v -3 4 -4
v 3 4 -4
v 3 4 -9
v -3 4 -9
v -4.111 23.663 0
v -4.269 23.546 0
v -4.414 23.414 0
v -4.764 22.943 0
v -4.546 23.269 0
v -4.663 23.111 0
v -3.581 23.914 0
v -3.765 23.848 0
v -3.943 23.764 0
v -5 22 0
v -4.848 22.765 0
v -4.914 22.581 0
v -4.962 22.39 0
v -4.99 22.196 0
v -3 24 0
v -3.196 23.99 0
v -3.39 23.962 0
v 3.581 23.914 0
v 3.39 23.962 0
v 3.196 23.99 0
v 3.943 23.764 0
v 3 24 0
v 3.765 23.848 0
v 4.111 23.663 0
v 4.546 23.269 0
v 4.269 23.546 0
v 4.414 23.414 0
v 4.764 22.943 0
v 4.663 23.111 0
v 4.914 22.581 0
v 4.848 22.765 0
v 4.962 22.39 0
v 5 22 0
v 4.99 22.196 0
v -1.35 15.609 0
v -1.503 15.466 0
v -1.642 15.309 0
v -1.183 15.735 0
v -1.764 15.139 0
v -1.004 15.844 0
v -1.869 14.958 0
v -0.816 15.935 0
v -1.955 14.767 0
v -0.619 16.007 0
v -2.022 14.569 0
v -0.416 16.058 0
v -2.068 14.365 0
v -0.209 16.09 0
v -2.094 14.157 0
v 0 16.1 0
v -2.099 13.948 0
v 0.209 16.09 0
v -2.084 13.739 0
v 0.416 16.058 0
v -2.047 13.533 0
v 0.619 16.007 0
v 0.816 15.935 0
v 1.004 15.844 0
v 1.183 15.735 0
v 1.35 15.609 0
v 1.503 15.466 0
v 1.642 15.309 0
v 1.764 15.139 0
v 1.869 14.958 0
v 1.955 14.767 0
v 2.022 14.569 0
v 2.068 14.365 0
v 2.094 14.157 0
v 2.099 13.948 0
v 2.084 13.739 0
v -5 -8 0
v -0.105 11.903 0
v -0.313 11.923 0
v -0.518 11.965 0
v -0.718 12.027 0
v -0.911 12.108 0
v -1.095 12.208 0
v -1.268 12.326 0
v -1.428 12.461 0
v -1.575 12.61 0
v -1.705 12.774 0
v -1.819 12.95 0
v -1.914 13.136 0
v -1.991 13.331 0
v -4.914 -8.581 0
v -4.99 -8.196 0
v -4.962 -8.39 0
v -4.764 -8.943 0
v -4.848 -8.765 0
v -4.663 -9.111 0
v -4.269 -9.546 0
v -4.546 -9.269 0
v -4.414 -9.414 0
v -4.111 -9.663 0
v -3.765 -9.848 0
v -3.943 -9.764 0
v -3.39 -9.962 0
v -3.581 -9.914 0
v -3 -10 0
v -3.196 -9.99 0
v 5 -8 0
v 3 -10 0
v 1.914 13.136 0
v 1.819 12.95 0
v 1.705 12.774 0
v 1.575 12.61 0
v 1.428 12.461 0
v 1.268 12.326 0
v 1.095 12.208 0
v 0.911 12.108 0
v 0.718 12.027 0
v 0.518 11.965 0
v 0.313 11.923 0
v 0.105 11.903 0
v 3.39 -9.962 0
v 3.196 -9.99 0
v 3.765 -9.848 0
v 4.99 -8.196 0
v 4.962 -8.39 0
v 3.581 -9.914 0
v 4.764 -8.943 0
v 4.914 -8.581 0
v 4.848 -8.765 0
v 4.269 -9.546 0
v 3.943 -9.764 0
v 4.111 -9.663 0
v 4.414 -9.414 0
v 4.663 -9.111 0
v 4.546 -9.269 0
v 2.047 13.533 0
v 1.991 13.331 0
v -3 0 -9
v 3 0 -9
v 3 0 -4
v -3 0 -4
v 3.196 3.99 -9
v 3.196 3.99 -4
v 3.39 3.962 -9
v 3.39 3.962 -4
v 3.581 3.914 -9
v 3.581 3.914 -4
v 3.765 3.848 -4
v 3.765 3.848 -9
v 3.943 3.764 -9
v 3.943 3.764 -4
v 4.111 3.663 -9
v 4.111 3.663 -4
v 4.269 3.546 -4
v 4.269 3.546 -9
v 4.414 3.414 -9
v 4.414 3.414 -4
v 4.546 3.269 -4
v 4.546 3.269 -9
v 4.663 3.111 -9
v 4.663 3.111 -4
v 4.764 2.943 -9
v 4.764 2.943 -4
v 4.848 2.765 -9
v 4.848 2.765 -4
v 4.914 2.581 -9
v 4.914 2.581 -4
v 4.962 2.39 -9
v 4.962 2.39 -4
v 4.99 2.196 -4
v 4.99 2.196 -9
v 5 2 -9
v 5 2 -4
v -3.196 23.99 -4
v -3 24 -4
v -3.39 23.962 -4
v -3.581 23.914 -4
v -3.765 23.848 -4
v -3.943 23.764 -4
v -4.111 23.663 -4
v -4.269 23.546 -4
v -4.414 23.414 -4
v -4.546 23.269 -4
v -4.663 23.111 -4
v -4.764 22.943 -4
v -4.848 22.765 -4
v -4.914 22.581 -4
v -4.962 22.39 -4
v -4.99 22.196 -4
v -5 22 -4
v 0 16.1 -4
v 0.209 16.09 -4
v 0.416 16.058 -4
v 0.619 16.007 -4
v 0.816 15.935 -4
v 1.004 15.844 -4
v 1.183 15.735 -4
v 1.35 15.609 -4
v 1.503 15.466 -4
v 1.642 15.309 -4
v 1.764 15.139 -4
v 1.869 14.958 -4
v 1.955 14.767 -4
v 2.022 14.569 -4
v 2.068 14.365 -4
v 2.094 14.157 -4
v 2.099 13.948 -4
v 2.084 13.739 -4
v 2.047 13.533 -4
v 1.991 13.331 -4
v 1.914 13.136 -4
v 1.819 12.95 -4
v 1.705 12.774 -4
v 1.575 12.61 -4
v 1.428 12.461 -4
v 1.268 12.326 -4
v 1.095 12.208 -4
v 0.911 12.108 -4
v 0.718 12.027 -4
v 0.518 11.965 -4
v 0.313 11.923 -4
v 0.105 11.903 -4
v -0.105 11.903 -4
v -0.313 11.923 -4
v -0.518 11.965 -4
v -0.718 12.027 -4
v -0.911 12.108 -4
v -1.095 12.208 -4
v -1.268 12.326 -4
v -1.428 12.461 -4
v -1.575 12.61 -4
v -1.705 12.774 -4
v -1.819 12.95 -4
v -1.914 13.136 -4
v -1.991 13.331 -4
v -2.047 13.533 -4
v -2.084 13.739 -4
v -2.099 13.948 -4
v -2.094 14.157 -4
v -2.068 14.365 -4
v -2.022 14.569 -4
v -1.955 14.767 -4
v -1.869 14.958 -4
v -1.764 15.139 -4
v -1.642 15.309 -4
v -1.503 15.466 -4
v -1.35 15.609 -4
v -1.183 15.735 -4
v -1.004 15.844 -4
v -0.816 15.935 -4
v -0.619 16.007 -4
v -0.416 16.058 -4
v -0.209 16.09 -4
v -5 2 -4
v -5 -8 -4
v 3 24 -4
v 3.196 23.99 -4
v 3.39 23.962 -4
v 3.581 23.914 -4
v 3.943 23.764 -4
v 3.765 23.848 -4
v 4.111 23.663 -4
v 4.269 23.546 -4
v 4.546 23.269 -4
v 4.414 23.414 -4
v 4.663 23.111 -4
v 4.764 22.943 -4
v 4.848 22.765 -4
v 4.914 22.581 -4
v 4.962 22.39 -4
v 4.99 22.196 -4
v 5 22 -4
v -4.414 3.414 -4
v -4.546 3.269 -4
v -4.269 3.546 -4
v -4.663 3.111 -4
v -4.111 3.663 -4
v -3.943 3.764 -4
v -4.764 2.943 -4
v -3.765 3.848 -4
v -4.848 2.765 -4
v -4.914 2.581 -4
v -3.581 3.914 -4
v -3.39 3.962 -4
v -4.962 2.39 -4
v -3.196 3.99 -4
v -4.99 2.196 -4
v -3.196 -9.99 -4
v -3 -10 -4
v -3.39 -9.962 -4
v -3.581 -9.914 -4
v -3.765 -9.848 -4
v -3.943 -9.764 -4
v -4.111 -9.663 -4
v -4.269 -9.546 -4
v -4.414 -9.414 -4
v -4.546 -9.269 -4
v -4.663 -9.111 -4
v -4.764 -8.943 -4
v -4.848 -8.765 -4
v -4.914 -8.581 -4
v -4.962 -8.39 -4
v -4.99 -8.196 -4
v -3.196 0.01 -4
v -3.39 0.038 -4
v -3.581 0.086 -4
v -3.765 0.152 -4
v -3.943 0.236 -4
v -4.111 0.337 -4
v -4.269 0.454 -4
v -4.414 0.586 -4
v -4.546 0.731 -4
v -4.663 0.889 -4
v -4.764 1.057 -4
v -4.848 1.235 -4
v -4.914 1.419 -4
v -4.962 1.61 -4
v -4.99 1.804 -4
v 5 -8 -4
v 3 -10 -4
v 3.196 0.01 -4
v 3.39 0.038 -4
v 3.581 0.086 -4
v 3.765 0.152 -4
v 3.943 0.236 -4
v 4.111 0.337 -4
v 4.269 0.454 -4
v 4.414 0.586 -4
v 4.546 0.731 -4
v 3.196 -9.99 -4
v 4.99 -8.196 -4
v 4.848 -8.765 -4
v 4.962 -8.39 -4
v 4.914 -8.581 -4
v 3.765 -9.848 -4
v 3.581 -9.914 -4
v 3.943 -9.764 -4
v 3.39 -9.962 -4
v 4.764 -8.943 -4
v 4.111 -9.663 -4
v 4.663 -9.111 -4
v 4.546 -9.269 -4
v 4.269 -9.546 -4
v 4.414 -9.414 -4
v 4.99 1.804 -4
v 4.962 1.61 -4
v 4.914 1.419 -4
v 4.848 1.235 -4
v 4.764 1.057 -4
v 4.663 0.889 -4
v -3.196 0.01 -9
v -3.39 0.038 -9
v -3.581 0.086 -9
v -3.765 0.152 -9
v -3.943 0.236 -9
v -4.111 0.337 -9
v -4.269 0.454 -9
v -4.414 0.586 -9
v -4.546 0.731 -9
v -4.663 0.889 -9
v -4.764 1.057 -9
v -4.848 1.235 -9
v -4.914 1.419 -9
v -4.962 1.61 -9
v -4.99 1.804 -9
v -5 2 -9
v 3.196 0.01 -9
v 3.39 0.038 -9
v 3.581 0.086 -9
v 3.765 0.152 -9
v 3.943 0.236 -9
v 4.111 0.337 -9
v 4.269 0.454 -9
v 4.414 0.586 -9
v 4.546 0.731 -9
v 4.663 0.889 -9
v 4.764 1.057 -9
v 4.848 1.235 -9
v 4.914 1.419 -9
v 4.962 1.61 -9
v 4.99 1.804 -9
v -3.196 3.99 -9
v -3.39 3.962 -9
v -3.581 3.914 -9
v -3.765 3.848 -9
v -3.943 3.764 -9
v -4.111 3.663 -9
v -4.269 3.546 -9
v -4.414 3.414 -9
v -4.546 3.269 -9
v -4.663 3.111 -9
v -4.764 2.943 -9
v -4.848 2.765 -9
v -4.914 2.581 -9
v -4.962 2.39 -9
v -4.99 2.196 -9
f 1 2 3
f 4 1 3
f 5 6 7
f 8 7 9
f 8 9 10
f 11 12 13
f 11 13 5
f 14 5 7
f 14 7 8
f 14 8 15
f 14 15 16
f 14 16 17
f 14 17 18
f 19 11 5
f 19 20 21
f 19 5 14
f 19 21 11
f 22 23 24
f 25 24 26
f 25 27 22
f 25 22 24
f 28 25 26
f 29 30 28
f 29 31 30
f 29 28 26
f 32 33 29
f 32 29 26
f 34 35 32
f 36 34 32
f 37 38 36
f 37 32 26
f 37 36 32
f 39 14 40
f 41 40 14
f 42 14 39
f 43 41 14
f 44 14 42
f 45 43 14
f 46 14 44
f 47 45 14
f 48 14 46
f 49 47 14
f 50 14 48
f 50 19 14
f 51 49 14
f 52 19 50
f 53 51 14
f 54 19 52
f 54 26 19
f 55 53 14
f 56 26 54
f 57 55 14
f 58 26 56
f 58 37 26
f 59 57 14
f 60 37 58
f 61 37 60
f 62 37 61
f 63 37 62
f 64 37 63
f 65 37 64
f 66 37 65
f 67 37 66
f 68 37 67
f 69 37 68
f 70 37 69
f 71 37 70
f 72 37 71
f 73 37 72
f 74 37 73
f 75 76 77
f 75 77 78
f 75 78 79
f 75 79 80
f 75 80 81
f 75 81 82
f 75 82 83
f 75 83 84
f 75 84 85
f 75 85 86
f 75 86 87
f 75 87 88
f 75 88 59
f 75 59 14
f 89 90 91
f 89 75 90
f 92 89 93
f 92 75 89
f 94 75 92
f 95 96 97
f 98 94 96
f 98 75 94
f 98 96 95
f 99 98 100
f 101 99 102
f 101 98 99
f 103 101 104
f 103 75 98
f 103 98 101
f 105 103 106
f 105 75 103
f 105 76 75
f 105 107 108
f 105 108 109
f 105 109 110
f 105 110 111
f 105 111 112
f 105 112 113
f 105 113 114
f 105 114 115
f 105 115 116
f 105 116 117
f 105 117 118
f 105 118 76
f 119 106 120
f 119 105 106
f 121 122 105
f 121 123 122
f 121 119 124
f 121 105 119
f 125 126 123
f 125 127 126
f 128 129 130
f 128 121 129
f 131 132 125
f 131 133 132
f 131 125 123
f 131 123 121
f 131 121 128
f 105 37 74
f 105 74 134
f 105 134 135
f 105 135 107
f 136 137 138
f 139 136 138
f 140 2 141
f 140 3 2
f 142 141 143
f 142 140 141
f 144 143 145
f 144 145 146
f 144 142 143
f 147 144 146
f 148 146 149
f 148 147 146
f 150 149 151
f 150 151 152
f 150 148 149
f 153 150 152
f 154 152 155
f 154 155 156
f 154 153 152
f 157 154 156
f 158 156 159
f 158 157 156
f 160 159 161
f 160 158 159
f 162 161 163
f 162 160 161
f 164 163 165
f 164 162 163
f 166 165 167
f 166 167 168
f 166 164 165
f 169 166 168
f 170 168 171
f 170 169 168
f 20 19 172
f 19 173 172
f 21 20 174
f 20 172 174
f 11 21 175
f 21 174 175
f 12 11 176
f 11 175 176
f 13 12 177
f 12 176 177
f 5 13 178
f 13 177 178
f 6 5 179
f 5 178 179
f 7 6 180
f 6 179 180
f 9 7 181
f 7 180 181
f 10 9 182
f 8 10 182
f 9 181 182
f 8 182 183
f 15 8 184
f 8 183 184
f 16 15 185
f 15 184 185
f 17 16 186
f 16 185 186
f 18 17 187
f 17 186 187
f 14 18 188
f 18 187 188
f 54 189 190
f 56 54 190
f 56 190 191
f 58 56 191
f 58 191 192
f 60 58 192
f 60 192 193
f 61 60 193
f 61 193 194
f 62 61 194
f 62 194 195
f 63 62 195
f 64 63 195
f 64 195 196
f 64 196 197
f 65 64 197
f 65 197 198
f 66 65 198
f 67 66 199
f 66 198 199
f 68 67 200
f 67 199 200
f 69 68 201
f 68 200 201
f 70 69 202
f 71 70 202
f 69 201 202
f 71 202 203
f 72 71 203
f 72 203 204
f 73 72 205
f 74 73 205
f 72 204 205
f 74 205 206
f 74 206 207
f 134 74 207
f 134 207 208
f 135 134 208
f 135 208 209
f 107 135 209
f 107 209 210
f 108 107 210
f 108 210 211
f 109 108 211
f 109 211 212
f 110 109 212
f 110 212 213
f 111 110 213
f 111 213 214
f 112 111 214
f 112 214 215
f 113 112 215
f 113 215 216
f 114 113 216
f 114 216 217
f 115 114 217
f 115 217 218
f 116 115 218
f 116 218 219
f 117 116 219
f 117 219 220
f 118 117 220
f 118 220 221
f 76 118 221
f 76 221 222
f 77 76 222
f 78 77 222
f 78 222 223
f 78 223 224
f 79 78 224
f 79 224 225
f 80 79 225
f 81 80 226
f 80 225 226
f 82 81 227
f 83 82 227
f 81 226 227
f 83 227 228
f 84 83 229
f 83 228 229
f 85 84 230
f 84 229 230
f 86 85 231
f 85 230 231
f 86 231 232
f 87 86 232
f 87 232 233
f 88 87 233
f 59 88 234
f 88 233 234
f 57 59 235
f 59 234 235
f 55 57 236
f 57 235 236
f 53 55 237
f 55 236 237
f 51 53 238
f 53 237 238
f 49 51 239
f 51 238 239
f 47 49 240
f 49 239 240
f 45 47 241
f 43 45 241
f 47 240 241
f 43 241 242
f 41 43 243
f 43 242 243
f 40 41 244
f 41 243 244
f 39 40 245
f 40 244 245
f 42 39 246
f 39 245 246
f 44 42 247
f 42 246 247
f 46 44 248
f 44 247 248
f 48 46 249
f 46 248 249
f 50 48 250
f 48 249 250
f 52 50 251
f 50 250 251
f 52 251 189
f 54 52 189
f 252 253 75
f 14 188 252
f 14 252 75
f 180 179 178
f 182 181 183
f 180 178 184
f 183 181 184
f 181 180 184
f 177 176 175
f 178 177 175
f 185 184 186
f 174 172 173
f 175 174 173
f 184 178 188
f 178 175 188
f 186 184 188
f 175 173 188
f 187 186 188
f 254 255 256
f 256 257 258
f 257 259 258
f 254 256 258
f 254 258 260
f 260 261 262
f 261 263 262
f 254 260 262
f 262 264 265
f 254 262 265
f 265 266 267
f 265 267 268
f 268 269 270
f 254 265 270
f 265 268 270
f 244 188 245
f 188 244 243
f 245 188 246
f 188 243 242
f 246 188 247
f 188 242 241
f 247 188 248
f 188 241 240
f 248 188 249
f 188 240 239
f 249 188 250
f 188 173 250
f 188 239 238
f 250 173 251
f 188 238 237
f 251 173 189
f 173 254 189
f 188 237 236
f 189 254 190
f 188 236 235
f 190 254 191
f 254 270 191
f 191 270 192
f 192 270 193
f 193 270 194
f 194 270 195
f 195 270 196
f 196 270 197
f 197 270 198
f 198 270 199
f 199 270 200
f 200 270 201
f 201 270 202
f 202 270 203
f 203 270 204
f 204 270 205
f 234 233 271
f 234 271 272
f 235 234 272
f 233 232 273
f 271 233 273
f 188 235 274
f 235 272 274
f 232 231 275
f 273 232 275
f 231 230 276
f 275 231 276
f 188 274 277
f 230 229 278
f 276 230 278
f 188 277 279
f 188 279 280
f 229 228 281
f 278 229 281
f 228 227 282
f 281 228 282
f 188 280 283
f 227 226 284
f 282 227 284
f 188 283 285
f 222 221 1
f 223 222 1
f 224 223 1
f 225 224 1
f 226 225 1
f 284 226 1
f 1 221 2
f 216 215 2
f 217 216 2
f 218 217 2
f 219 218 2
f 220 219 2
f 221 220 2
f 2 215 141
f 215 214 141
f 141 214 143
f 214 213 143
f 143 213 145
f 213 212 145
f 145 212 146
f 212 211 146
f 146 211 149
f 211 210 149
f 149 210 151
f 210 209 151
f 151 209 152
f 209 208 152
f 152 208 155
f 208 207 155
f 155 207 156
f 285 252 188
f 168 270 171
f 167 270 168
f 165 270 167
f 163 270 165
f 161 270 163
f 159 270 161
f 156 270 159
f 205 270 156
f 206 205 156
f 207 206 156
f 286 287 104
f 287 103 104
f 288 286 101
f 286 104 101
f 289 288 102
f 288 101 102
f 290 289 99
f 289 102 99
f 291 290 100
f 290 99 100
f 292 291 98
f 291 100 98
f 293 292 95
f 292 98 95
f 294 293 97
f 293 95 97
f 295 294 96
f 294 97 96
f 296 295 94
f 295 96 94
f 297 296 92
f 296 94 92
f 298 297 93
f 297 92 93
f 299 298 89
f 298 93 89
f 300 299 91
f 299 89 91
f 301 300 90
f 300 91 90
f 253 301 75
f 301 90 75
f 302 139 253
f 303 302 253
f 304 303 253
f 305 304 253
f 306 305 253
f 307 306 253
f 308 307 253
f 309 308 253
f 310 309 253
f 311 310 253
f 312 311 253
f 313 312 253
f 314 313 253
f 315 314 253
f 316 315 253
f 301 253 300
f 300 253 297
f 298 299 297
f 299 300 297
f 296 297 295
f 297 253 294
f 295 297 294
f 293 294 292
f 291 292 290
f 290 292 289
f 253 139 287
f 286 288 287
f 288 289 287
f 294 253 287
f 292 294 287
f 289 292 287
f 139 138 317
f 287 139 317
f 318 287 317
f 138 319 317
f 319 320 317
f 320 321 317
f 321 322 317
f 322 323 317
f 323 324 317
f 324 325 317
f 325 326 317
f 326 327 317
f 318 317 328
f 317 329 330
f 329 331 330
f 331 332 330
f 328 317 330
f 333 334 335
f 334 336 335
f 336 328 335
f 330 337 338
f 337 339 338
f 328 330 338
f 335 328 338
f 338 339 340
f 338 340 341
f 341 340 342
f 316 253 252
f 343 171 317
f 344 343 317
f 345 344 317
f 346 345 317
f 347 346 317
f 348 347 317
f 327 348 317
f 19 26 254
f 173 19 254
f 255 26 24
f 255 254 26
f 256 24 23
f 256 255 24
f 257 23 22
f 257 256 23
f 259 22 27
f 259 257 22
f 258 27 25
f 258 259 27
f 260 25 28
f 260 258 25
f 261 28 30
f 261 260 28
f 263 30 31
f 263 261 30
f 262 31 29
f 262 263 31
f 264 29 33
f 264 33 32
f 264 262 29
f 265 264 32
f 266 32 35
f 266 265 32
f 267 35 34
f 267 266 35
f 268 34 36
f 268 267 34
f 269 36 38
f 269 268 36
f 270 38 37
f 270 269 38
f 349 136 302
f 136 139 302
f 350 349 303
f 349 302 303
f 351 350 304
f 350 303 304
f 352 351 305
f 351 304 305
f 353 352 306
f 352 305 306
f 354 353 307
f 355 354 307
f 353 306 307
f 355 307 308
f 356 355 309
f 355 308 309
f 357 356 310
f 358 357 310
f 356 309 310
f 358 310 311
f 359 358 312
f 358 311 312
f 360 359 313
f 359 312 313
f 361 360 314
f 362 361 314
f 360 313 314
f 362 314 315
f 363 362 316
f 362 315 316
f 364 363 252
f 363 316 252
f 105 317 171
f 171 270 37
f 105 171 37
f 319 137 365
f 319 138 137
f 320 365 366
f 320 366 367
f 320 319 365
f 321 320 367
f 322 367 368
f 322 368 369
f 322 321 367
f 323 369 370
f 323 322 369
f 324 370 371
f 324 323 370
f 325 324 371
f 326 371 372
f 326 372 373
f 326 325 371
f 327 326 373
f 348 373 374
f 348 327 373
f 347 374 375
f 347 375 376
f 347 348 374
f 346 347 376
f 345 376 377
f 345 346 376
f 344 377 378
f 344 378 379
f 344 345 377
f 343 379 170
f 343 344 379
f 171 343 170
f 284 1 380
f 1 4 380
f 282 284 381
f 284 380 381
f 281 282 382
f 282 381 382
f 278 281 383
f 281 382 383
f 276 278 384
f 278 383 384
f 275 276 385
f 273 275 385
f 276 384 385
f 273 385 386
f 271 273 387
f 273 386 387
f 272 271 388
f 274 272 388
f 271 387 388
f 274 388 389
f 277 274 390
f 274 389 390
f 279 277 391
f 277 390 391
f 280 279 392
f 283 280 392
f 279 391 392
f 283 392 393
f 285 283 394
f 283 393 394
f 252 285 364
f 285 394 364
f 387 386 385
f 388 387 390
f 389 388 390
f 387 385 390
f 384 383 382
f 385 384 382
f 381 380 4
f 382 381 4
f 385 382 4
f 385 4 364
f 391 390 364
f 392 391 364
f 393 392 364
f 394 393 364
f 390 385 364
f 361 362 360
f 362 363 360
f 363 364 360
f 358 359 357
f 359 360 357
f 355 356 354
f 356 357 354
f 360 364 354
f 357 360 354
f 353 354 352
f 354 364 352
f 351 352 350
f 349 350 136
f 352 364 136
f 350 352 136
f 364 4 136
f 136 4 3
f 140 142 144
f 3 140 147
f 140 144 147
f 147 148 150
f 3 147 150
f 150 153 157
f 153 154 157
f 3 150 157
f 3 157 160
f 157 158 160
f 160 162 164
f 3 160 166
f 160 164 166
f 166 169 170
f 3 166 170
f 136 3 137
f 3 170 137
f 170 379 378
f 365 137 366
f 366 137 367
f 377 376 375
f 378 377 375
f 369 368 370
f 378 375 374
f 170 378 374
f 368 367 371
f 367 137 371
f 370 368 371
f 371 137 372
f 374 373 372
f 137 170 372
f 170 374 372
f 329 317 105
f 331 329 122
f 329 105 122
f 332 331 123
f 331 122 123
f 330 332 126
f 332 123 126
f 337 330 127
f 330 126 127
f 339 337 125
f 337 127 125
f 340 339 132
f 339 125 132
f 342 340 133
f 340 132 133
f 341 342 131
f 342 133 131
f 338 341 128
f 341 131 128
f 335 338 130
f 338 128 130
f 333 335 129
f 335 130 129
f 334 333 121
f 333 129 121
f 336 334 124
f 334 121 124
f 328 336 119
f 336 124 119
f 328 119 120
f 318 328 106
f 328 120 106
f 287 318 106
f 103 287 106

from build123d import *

# Parameters (mm, degrees)
EXTRUDE_1_DEPTH     = 5
FILLET_1_R          = 2
SKETCH_2_R          = 2.1
CUT_EXTRUDE_1_DEPTH = 26.019992006


with BuildPart() as part:
    # Эскиз1 → Бобышка-Вытянуть1 (new, symmetric)
    with BuildSketch(Plane(origin=(0, 0, 0), x_dir=(0, 0, -1), z_dir=(1, 0, 0))):
        Polygon((0, 0), (0, 24), (4, 24), (4, 4), (9, 4), (9, 0), (4, 0), (4, -10), (0, -10), align=None)
    extrude(amount=EXTRUDE_1_DEPTH, both=True)

    # Скругление1
    fillet_1_edges = [part.edges().sort_by_distance(p)[0] for p in [
        (-5, 0, -6.5),
        (-5, 4, -6.5),
        (5, 4, -6.5),
        (5, 0, -6.5),
        (5, 24, -2),
        (-5, 24, -2),
        (-5, -10, -2),
        (5, -10, -2),
    ]]
    fillet(fillet_1_edges, radius=FILLET_1_R - 0.0001)  # a hair under: the kernel refuses the full size

    # Эскиз2 → Вырез-Вытянуть1 (cut, through all)
    with BuildSketch(Plane(origin=(0, 0, -4), x_dir=(-1, 0, 0), z_dir=(0, 0, -1))):
        with Locations(Location((0, 14, 0), (0, 0, 90))):
            Circle(SKETCH_2_R)
    extrude(amount=-CUT_EXTRUDE_1_DEPTH, mode=Mode.SUBTRACT)


solid = part.part
